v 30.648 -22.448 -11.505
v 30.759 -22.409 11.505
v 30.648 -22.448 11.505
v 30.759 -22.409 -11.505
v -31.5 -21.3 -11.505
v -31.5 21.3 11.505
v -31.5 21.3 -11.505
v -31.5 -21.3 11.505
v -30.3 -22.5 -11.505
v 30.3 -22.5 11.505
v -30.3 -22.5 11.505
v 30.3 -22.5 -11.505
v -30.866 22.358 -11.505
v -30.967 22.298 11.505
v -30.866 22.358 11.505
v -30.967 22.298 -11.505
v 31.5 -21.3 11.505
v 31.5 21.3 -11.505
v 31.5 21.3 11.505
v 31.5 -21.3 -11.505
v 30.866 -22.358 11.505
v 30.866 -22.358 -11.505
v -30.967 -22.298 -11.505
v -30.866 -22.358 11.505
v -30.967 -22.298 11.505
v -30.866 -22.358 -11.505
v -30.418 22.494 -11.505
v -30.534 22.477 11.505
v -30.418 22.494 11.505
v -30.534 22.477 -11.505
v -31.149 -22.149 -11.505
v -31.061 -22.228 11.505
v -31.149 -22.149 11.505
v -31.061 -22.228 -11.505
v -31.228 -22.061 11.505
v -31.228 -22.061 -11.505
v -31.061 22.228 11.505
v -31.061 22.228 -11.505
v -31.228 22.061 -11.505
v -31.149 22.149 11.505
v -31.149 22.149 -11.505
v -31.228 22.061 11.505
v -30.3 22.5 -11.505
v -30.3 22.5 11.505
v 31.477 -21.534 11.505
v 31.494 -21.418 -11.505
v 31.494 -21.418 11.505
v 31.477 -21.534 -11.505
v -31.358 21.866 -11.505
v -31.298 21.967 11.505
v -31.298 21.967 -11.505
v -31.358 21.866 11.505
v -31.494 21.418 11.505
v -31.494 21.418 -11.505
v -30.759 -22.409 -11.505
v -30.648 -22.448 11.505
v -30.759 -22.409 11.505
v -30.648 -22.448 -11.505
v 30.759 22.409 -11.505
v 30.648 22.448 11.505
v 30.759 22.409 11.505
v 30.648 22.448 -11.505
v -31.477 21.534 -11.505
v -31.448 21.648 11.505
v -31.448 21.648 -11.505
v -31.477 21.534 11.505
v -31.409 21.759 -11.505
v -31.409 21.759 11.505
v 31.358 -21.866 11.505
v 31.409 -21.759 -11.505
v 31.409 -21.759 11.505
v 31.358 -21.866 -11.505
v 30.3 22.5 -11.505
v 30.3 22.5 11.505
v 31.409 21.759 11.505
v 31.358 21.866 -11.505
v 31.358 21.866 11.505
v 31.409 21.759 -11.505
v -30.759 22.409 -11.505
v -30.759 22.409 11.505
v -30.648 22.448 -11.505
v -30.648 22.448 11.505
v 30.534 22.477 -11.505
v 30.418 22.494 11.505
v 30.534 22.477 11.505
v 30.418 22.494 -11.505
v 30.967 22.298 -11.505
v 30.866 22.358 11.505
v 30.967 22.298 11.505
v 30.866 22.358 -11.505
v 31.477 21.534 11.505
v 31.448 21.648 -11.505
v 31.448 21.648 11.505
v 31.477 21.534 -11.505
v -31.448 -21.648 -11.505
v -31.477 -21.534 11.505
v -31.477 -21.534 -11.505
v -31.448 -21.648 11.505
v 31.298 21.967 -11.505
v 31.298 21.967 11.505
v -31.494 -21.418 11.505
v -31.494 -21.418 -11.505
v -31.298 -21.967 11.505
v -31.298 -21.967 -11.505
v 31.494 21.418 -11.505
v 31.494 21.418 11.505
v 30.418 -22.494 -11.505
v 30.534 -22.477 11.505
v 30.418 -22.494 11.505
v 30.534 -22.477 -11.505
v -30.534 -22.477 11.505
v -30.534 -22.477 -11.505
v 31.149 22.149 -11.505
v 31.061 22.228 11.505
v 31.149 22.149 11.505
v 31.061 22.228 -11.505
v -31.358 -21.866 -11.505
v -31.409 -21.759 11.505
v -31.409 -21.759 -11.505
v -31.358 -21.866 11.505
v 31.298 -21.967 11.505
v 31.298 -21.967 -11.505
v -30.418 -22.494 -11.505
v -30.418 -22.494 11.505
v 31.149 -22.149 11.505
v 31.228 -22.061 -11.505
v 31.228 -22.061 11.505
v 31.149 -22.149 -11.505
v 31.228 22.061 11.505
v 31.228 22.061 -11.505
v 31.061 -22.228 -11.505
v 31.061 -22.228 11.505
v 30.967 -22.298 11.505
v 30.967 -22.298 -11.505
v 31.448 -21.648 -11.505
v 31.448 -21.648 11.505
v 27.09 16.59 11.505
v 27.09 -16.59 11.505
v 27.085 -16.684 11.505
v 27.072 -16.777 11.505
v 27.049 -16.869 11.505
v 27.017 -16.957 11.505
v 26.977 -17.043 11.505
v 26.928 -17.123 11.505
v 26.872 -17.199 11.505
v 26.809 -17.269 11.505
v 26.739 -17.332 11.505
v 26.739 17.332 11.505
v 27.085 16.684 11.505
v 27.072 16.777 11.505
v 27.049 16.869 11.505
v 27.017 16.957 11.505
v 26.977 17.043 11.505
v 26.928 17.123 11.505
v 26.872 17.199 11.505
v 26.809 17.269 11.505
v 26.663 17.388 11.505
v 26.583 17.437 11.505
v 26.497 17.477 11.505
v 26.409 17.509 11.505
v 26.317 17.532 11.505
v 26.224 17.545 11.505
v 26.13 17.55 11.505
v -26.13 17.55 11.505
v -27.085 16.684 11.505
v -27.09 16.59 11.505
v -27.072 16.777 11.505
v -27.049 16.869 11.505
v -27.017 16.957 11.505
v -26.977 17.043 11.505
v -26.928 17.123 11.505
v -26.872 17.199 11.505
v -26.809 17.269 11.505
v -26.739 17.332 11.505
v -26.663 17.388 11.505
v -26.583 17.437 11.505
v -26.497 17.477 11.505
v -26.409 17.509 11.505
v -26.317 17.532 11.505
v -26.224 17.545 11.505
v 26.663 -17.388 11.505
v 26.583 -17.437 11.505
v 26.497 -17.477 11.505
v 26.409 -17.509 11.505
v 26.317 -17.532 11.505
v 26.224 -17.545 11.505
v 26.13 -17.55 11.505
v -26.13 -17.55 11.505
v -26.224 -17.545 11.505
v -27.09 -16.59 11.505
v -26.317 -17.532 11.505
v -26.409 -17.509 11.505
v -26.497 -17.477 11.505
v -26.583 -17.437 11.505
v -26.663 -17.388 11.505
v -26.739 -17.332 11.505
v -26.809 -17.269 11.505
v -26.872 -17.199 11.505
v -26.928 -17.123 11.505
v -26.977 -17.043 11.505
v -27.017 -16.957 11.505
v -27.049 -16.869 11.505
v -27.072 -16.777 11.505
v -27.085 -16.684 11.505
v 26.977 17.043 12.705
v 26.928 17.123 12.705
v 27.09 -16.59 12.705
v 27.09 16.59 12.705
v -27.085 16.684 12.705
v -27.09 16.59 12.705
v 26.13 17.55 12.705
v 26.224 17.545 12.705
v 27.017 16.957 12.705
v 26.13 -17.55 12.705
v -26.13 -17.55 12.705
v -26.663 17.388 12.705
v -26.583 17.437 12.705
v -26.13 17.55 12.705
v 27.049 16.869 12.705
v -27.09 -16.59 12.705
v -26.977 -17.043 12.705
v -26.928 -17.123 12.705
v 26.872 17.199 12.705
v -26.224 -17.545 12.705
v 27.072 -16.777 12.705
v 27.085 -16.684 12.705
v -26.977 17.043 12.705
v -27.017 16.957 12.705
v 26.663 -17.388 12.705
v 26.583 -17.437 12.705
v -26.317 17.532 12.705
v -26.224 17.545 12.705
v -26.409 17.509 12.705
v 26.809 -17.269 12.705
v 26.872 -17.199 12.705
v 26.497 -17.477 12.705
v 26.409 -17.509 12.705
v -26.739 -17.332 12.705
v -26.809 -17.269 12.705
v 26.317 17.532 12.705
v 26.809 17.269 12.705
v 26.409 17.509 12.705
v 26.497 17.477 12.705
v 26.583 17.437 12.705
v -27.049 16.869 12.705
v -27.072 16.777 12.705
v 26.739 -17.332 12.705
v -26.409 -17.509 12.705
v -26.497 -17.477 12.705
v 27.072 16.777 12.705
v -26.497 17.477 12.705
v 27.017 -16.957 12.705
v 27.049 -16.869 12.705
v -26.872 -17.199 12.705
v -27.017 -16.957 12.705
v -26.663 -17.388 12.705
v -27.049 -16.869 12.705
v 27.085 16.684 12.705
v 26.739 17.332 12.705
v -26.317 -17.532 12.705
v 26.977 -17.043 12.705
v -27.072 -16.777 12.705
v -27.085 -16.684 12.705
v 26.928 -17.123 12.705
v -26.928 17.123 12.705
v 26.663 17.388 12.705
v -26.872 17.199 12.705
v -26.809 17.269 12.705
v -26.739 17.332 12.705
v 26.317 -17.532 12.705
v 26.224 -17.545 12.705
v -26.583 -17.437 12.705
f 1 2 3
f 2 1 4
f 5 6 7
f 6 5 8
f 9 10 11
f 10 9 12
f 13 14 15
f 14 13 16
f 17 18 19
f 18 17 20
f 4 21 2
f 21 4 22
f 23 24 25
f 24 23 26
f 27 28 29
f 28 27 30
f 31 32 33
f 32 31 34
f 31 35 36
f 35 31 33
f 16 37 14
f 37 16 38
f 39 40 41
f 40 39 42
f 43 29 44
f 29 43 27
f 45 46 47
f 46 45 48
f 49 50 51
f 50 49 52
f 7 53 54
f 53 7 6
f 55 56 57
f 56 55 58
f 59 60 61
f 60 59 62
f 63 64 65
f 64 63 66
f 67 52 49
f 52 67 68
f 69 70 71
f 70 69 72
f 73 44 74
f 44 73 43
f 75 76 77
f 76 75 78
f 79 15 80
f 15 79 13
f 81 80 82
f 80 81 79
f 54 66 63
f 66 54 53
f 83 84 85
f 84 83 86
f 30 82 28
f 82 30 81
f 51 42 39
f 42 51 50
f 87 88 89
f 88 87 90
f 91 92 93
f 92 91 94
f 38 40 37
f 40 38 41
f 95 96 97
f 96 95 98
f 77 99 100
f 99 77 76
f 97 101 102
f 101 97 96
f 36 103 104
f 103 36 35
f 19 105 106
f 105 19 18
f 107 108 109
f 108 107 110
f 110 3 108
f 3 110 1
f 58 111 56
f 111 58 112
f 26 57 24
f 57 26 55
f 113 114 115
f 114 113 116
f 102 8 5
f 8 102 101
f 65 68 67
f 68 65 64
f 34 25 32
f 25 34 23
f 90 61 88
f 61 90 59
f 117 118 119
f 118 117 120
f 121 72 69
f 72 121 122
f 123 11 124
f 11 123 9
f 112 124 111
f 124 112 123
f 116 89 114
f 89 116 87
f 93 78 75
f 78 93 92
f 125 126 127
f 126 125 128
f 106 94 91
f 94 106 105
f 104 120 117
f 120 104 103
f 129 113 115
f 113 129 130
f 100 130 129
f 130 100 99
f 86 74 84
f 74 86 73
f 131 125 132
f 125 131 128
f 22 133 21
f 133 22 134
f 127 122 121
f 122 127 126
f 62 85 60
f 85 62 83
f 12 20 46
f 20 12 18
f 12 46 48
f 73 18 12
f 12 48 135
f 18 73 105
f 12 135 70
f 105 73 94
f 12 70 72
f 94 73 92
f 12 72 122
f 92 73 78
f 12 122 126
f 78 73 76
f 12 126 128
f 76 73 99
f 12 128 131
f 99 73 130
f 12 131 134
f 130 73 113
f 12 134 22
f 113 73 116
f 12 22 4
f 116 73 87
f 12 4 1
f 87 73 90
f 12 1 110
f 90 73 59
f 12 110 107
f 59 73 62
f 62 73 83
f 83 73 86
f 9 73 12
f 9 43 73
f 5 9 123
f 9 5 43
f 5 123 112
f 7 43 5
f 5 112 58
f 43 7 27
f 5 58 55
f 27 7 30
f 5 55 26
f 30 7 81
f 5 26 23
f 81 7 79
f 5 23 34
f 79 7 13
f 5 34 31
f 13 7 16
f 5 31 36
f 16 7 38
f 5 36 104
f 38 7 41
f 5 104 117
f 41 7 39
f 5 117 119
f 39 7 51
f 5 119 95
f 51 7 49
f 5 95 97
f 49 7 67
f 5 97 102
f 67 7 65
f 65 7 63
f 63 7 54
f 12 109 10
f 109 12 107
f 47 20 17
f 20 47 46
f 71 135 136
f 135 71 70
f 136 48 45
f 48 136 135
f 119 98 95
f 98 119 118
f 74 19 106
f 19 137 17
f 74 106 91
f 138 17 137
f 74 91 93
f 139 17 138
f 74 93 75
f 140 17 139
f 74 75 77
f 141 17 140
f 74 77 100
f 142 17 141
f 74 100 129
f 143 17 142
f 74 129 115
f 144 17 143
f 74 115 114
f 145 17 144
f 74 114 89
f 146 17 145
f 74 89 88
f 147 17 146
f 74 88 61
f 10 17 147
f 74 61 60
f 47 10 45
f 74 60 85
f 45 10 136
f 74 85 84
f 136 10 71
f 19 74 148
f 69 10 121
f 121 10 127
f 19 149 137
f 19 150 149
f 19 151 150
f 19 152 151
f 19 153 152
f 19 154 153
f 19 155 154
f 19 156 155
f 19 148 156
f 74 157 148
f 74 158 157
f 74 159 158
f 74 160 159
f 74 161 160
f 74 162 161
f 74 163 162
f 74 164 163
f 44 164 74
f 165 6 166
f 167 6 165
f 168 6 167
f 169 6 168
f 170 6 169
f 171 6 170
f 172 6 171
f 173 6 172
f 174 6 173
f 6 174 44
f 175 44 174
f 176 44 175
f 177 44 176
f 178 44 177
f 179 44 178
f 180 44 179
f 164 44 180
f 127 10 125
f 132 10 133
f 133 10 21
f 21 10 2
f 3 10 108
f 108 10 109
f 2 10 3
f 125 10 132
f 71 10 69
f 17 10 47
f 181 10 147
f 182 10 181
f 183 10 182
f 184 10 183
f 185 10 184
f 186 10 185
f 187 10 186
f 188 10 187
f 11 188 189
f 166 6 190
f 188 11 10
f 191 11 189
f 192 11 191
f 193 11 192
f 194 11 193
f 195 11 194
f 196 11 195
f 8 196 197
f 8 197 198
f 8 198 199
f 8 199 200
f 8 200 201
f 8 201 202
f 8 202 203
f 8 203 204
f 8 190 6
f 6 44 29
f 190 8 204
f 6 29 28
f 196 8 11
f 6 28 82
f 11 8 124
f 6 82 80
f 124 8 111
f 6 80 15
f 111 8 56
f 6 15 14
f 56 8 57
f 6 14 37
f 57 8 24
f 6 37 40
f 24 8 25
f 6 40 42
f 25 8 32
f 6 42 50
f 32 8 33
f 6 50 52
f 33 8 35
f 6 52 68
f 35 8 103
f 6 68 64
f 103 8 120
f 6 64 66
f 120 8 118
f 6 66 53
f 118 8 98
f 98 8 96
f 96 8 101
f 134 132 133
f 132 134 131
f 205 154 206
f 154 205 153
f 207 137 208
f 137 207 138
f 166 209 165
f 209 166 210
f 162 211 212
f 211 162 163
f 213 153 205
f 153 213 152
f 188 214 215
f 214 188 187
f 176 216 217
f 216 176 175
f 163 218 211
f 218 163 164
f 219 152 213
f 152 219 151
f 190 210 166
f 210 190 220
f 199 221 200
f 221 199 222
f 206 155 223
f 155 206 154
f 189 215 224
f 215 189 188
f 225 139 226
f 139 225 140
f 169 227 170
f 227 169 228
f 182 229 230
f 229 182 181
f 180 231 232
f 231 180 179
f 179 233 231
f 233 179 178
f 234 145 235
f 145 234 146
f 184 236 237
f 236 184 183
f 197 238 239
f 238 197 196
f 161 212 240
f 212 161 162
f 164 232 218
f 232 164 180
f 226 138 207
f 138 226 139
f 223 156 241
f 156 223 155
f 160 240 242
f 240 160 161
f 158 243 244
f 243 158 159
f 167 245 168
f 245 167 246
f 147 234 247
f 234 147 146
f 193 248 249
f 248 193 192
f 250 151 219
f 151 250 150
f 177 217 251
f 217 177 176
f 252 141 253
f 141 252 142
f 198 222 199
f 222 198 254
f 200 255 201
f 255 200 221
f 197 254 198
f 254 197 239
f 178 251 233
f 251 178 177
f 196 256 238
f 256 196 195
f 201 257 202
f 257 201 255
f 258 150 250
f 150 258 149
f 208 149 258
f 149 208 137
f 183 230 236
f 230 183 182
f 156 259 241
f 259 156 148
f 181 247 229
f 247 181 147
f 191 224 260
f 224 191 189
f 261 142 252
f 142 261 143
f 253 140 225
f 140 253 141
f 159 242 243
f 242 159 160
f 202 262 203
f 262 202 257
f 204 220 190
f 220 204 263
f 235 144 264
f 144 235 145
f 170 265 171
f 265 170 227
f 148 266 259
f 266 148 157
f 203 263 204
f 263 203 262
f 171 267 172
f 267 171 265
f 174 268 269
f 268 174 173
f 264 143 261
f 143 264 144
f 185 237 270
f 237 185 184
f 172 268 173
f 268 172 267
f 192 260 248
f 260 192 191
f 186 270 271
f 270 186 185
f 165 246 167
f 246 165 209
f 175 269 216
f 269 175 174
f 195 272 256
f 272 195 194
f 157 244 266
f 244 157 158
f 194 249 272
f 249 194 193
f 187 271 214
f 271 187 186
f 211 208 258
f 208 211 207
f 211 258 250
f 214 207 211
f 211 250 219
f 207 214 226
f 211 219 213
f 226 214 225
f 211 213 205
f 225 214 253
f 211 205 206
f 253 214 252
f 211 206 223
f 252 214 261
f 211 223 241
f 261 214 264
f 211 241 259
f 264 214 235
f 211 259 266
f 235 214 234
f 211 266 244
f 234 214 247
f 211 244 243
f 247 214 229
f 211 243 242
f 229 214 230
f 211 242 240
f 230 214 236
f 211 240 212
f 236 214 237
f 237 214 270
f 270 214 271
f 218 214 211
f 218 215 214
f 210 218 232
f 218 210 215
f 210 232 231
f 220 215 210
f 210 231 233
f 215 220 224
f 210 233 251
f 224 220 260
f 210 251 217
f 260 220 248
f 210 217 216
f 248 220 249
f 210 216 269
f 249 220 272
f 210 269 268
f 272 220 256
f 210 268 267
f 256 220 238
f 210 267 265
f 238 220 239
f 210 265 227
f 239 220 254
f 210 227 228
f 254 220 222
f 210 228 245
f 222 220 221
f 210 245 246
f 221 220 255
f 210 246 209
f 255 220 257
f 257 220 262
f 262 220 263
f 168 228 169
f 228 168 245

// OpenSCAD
$fn = 64;

// Overall dimensions (mm)
length = 63.0;
width  = 45.0;
height = 23.0;

// Small edge rounding
corner_r = 1.2;

// Rounded rectangular prism, centered
module rounded_box(size=[10,10,10], r=1) {
    l = size[0]; w = size[1]; h = size[2];
    r2 = min(r, l/2, w/2);

    // Use minkowski for robust, always-visible geometry
    minkowski() {
        cube([l - 2*r2, w - 2*r2, h], center=true);
        cylinder(r=r2, h=0.01, center=true);
    }
}

// Solid State Relay module (one connected solid)
module ssr_module() {
    pad_l = length * 0.86;
    pad_w = width  * 0.78;
    pad_h = 1.6;
    overlap = 0.4;

    color("DimGray")
    union() {
        // Main body
        rounded_box([length, width, height], r=corner_r);

        // Raised top pad (connected with overlap)
        translate([0, 0, height/2 + pad_h/2 - overlap])
            rounded_box([pad_l, pad_w, pad_h], r=corner_r*0.8);
    }
}

ssr_module();
